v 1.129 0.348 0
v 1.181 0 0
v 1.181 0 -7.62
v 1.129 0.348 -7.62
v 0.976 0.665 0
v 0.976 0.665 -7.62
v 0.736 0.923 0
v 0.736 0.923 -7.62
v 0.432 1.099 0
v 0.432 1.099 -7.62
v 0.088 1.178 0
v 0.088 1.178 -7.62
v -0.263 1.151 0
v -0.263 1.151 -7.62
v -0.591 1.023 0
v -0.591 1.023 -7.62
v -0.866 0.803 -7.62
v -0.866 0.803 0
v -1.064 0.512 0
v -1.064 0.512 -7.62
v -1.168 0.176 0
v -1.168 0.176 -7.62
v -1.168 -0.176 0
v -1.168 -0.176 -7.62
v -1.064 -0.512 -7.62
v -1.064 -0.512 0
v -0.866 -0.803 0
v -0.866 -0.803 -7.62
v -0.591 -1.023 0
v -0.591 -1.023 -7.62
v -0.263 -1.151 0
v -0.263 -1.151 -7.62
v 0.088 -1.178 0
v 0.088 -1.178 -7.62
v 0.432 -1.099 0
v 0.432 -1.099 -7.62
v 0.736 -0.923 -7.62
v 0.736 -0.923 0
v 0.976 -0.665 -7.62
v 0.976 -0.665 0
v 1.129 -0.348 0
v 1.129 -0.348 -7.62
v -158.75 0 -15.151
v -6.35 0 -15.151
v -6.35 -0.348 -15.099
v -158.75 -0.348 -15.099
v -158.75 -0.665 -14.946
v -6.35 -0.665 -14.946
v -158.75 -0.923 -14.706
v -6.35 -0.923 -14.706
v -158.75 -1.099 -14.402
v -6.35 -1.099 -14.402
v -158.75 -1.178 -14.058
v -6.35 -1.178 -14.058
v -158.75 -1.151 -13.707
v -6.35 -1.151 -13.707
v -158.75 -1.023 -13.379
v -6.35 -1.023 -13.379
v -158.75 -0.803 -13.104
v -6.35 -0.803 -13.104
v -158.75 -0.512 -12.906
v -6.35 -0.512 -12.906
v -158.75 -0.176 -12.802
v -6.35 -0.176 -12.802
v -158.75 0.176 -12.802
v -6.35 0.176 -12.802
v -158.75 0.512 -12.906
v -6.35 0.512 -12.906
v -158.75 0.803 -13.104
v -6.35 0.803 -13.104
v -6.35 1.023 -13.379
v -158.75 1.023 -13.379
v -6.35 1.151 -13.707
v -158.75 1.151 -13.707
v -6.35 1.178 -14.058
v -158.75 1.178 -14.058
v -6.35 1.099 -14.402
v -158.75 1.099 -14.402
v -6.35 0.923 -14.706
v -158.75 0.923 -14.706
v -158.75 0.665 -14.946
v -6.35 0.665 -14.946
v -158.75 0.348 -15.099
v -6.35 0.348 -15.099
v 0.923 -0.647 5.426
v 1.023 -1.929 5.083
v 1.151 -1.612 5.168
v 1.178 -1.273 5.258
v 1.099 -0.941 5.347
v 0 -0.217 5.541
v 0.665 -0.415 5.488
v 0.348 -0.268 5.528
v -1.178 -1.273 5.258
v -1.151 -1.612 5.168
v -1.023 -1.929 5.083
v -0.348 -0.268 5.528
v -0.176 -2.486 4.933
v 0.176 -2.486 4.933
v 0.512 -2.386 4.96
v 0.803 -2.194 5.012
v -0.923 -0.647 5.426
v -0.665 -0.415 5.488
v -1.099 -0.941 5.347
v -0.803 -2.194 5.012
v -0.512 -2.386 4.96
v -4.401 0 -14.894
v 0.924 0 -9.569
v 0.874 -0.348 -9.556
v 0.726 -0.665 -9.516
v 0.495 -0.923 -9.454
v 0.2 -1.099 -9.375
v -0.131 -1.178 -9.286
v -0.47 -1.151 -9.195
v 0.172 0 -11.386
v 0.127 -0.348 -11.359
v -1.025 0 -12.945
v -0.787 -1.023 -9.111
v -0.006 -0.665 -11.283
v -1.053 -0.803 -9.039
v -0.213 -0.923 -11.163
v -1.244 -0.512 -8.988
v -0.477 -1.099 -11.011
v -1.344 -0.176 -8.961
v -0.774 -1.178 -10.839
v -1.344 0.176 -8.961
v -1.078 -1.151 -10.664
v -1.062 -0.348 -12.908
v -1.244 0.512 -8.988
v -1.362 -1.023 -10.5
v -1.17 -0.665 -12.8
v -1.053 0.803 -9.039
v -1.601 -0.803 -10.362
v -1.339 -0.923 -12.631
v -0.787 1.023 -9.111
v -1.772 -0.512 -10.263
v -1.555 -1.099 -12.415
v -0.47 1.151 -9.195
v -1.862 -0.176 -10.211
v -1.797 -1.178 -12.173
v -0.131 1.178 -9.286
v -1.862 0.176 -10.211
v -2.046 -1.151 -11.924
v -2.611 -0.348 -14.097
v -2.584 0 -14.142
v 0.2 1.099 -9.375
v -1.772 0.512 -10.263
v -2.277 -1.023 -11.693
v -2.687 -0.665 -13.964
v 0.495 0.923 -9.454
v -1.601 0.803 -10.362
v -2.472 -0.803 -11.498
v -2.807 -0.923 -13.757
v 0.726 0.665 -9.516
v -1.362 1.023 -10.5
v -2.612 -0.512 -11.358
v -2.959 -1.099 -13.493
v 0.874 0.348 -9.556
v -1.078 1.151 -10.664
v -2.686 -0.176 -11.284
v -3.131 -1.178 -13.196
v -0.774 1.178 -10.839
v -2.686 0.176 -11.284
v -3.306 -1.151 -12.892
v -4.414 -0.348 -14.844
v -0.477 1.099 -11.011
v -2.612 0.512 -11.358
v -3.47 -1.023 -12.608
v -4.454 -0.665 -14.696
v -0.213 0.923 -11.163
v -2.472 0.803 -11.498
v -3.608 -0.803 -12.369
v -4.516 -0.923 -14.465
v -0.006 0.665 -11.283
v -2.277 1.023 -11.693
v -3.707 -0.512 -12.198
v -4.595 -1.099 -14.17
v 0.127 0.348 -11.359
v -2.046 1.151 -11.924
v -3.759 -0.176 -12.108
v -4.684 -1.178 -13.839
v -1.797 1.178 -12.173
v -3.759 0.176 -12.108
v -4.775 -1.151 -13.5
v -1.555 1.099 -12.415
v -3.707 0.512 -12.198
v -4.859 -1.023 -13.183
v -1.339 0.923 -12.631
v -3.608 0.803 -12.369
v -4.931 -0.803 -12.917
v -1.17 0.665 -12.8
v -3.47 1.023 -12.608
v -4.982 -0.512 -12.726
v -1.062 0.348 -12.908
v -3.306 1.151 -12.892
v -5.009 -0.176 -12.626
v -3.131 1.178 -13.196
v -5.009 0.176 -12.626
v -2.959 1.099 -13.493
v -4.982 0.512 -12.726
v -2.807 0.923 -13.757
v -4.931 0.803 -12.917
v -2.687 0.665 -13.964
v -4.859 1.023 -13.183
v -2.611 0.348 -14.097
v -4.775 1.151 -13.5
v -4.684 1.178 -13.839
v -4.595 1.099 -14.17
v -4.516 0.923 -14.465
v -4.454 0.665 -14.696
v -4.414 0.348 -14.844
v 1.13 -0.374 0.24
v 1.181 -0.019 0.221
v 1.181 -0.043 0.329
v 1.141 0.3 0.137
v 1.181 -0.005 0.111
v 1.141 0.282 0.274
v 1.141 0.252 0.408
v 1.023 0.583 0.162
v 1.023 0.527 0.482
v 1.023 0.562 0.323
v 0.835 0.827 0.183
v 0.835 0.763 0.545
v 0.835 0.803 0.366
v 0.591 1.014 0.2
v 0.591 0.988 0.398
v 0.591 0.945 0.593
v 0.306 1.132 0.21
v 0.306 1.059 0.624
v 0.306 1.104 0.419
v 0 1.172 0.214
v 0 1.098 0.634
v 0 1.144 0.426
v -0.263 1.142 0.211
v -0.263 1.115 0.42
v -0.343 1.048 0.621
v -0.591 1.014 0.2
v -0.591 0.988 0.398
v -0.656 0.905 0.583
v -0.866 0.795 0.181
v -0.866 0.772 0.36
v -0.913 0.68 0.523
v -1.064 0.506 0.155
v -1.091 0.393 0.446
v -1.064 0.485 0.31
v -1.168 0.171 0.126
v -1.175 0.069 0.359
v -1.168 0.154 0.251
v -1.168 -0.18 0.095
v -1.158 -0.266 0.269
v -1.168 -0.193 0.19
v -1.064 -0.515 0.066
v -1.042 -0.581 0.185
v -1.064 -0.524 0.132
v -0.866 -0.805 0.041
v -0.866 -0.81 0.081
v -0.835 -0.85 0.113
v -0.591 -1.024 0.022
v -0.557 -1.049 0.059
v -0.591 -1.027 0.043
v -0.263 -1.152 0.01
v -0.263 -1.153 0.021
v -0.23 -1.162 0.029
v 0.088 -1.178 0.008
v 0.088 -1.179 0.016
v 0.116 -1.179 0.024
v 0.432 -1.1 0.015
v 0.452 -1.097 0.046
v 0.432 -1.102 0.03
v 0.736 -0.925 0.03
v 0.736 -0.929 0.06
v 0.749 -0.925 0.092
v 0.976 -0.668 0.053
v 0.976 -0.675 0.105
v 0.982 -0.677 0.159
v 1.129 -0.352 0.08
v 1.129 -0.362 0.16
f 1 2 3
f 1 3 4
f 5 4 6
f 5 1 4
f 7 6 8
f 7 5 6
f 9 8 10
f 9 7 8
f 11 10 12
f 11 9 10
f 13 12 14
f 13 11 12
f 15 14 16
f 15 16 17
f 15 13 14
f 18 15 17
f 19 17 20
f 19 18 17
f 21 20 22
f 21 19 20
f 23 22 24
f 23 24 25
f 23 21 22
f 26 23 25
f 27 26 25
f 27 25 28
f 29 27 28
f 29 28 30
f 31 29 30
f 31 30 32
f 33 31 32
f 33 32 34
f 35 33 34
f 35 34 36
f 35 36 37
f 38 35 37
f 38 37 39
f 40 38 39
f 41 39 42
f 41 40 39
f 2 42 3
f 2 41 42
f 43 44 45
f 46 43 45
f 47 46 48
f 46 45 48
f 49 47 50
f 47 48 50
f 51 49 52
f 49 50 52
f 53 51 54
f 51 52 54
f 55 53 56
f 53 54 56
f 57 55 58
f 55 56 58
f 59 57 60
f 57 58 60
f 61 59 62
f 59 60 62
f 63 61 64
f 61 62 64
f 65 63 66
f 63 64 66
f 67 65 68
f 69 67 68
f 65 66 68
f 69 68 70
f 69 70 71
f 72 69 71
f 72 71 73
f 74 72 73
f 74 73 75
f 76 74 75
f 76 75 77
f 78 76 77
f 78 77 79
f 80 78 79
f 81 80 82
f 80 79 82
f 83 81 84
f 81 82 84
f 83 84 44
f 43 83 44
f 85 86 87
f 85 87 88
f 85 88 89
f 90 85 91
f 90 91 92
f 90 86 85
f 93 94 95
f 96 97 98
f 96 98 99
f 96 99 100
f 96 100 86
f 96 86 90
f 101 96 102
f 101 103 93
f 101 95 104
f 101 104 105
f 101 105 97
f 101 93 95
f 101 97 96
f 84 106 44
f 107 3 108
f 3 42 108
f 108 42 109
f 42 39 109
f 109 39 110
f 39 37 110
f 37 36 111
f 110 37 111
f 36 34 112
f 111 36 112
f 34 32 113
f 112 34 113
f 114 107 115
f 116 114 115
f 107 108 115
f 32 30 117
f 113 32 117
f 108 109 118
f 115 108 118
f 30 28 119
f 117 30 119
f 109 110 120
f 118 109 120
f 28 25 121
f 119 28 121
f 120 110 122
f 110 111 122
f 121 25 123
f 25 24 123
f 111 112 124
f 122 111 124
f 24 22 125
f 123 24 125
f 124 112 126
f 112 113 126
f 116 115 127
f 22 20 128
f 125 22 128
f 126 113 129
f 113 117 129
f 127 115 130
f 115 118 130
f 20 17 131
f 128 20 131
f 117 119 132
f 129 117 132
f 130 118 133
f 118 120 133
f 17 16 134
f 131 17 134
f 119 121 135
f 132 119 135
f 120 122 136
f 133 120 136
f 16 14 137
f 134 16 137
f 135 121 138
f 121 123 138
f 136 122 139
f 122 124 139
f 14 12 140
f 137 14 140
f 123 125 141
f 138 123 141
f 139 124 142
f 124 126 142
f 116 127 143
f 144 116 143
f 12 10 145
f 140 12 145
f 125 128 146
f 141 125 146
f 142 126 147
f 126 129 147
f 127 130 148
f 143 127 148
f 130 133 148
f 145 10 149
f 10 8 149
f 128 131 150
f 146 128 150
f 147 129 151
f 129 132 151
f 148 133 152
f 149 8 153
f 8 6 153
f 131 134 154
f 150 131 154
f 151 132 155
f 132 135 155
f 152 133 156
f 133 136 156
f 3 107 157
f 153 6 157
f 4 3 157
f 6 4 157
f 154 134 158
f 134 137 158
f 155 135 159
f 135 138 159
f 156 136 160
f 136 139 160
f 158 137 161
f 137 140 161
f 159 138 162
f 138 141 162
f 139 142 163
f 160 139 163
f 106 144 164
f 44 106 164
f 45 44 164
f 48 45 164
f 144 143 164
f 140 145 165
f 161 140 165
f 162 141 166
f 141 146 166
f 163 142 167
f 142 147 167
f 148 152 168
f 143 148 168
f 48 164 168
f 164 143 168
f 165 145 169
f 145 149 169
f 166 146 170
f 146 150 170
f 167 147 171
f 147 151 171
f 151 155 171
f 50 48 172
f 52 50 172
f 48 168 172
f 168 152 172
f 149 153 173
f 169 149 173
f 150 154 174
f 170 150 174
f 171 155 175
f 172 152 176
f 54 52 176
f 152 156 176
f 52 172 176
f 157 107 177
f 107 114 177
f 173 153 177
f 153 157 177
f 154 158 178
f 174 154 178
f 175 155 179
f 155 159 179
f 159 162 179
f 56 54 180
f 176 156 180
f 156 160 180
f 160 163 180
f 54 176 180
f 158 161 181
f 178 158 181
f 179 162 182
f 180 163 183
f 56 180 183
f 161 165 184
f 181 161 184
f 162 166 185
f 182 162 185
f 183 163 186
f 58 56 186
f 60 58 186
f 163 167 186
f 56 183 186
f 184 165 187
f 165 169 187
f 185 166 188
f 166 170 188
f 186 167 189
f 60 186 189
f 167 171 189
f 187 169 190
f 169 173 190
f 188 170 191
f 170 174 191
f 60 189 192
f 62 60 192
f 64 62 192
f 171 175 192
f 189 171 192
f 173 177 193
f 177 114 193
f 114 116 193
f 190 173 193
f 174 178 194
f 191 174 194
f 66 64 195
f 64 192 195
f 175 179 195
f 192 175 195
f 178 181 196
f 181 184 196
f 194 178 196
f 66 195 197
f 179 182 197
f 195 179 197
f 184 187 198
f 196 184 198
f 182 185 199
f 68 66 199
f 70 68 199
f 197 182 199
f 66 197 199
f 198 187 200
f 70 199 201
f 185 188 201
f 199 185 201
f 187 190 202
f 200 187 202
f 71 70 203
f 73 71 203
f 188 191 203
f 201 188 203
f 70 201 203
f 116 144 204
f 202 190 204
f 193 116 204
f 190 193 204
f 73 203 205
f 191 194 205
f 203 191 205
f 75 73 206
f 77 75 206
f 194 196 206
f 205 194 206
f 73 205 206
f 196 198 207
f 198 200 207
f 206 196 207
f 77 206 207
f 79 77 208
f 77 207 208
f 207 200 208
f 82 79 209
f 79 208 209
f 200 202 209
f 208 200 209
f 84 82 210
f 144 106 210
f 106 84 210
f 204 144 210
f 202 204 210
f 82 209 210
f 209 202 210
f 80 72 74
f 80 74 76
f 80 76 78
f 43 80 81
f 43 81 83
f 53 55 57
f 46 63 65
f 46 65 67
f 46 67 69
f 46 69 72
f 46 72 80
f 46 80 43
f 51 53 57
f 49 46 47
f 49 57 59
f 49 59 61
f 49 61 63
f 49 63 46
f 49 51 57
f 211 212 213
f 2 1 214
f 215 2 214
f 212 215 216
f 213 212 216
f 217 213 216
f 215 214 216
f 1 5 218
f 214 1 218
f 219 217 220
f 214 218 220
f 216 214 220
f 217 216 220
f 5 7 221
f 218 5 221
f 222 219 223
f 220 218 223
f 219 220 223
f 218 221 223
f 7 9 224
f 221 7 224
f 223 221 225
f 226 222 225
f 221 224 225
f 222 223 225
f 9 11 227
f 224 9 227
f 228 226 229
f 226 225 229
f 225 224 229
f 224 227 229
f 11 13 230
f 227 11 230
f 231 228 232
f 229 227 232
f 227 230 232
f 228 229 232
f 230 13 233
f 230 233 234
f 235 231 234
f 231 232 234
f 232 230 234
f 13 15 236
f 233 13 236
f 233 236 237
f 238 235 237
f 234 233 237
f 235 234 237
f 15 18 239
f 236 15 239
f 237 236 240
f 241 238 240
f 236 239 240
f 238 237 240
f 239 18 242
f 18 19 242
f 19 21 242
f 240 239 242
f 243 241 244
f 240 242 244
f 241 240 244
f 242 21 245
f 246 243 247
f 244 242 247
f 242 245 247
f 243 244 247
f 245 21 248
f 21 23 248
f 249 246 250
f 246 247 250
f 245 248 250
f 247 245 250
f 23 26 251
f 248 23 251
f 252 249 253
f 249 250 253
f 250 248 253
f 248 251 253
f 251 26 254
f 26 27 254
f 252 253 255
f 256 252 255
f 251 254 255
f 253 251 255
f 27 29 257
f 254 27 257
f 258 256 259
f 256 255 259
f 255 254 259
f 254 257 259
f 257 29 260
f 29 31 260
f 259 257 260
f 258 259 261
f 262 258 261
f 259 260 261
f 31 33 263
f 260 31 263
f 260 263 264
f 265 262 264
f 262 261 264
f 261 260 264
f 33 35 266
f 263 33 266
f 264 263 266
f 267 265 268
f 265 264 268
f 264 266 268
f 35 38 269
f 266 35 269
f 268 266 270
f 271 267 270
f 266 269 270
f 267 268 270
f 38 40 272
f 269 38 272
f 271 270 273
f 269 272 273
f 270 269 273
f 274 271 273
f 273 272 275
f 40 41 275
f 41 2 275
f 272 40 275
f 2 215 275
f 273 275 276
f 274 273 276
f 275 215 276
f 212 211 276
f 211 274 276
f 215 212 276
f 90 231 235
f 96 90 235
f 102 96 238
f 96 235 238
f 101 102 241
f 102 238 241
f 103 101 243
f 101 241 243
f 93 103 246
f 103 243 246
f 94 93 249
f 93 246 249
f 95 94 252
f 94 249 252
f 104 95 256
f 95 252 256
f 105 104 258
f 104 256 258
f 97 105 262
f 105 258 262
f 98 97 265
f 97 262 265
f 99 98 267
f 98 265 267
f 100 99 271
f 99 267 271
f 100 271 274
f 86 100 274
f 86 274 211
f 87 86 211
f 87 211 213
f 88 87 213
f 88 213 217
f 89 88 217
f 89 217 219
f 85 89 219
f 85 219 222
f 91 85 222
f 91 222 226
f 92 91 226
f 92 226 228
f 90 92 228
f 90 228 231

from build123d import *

# Parameters (mm, degrees)
SKETCH1_R           = 1.1811
RODEND_DEPTH        = 7.62
SKETCH4_R           = 1.1811
REVOLVE1_ANGLE      = 90
SKETCH5_R           = 1.1811
BOSS_EXTRUDE1_DEPTH = 152.4
SKETCH6_R           = 1.1811
REVOLVE2_ANGLE      = 15
SKETCH7_R           = 1.1811
BOSS_EXTRUDE2_DEPTH = 5.08


with BuildPart() as part:
    # Sketch1 → RodEnd (new body)
    with BuildSketch(Plane.XY):
        Circle(SKETCH1_R)
    extrude(amount=-RODEND_DEPTH)

    # Sketch4 → Revolve1 (revolve)
    with BuildSketch(Plane(origin=(0, 0, -7.62), x_dir=(-1, 0, 0), z_dir=(0, 0, -1))):
        with Locations(Location((0, 0, 0), (0, 0, 180))):
            Circle(SKETCH4_R)
    revolve(axis=Axis((-6.35, 0, -7.62), (0, 1, 0)), revolution_arc=REVOLVE1_ANGLE)

    # Sketch5 → Boss-Extrude1 (add)
    with BuildSketch(Plane.ZY.offset(6.35)):
        with Locations(Location((-13.97, 0, 0), (0, 0, 180))):
            Circle(SKETCH5_R)
    extrude(amount=BOSS_EXTRUDE1_DEPTH)

    # Sketch6 → Revolve2 (revolve)
    with BuildSketch(Plane.XY):
        Circle(SKETCH6_R)
    revolve(axis=Axis((0, -1.27, 0), (1, 0, 0)), revolution_arc=REVOLVE2_ANGLE)

    # Sketch7 → Boss-Extrude2 (add)
    with BuildSketch(Plane(origin=(0, -0.085073869, 0.3175), x_dir=(-1, 0, 0), z_dir=(0, -0.25881904510252135, 0.9659258262890682))):
        with Locations(Location((0, -0.043274201, 0), (0, 0, 270))):
            Circle(SKETCH7_R)
    extrude(amount=BOSS_EXTRUDE2_DEPTH)


solid = part.part
